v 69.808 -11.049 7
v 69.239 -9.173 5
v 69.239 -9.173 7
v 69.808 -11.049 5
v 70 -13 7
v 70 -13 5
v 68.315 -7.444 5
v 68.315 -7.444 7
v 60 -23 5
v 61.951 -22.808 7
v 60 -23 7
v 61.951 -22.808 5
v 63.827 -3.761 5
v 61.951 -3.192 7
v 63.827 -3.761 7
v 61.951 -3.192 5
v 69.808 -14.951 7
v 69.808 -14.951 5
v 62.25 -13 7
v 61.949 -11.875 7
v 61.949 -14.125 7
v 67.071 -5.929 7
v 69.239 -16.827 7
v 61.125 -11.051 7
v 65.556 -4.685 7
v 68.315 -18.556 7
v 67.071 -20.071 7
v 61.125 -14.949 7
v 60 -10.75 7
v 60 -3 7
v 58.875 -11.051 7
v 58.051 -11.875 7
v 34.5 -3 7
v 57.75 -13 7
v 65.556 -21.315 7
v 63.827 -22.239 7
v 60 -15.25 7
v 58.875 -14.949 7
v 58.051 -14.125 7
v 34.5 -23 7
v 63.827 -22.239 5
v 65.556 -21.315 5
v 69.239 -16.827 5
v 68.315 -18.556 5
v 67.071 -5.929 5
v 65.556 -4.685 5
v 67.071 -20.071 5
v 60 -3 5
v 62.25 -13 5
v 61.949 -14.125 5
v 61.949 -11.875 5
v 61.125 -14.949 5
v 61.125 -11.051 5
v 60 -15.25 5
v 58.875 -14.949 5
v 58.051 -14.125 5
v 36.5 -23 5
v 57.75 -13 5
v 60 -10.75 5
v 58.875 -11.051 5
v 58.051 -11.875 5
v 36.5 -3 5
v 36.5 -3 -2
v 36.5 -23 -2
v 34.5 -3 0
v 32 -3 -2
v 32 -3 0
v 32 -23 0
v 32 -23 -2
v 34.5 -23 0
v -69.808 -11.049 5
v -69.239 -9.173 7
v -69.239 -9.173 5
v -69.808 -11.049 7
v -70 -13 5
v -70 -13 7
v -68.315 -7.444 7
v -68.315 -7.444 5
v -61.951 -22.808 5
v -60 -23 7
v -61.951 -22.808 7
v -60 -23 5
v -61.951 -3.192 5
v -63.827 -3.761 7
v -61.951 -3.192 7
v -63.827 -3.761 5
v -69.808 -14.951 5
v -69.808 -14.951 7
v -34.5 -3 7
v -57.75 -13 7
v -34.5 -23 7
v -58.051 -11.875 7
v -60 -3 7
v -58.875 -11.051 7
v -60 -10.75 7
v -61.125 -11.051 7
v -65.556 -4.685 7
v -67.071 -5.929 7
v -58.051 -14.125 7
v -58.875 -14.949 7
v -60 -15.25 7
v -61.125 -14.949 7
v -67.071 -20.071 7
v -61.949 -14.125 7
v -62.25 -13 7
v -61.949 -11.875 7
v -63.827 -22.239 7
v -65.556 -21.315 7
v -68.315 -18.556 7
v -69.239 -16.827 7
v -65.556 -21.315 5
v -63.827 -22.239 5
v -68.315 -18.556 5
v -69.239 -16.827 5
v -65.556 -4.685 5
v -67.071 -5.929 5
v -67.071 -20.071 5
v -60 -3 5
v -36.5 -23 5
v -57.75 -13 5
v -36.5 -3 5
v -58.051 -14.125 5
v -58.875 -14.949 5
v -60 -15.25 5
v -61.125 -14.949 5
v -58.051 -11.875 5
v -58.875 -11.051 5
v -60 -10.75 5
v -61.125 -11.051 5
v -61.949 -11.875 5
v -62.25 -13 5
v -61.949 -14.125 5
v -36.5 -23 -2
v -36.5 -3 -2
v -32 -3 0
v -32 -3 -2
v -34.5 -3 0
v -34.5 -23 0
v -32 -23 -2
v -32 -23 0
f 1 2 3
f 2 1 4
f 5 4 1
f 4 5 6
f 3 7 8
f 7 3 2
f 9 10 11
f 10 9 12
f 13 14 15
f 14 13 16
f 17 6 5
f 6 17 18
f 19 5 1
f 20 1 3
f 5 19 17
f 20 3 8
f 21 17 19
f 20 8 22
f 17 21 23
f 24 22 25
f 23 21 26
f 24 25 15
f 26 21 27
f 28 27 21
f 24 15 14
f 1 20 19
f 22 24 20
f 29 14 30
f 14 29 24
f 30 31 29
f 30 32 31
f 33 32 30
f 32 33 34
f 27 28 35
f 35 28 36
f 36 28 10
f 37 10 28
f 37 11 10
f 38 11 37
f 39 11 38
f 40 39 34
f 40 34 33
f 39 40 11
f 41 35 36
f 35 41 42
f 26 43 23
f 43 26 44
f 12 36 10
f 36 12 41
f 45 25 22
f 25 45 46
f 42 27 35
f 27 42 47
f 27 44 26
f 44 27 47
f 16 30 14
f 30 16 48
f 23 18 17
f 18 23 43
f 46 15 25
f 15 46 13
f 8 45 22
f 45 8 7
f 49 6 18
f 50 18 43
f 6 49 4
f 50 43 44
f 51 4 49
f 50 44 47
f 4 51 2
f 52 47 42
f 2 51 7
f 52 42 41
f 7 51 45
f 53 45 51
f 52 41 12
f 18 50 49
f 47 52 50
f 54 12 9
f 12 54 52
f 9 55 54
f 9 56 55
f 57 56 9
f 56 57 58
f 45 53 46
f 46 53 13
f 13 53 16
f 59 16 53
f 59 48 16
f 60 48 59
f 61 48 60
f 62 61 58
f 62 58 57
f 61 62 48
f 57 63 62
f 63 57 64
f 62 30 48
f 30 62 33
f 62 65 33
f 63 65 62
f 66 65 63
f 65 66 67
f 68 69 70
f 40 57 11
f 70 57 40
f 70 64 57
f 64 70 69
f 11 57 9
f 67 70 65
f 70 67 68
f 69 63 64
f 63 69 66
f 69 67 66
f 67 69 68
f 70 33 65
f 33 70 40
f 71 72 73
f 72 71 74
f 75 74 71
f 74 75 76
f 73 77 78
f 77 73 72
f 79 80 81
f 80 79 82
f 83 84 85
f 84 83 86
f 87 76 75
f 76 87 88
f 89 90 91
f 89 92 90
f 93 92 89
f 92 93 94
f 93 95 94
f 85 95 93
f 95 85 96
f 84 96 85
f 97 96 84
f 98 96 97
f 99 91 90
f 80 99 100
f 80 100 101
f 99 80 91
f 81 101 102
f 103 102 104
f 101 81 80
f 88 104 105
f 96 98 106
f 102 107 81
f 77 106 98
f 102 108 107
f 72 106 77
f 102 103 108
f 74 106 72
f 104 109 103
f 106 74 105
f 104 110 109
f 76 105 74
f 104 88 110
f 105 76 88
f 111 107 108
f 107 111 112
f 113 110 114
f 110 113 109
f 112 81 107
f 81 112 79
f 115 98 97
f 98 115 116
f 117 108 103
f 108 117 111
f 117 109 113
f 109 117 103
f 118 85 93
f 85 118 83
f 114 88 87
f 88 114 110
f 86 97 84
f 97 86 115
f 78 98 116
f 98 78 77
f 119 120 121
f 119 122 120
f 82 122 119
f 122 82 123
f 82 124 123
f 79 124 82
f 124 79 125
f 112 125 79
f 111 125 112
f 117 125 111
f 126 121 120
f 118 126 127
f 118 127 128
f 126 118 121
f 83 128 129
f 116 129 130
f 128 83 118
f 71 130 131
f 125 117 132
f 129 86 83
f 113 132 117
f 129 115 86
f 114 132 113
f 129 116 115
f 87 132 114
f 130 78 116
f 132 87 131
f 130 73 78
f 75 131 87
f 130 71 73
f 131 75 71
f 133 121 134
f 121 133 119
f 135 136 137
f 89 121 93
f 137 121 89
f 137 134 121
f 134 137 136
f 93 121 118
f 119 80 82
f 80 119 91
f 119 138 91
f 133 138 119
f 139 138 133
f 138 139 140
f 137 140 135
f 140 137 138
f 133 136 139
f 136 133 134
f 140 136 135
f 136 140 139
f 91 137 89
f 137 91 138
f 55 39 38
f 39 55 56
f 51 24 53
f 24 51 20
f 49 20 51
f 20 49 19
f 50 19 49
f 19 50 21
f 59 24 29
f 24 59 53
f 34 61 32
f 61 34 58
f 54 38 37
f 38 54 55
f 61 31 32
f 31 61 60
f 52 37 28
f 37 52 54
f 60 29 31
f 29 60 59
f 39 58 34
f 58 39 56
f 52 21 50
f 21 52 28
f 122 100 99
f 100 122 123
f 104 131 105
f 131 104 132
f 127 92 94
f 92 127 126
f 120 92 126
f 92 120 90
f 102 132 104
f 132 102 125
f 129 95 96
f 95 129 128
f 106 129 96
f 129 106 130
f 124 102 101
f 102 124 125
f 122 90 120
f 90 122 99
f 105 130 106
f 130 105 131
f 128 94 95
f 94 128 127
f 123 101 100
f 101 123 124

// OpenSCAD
bot_thick = 2;
hole_pos_x = 60;
hole_d = 4.5;
bridge_w = 20;
bridge_start=36.5;
bridge_conn=32;
bridge_h=5;
bridge_y_adj=-13;

difference() {
    union() {
        //import("Xperia-10-iii-Cover.stl");
        translate([0,bridge_y_adj,0]) for (m = [0,1]) mirror([m,0,0]) {
            $fn = 32;
            // Bridge platform
            translate([hole_pos_x,0,bridge_h]) cylinder(bot_thick, bridge_w/2, bridge_w/2);
            // Bridge rounding
            translate([bridge_start,-bridge_w/2,bridge_h]) cube([hole_pos_x-bridge_start,bridge_w,bot_thick]);
            // Bridge entry
            translate([bridge_conn,-bridge_w/2,-bot_thick]) cube([bridge_start-bridge_conn,bridge_w,bot_thick]);
            // Vertical part of the bridge
            translate([bridge_start-bot_thick,-bridge_w/2,0]) cube([bot_thick,bridge_w,bridge_h+bot_thick]);


            
        }
    }
    for (x = [hole_pos_x, -hole_pos_x]) {
        $fn = 12;
        translate([x,bridge_y_adj,0]) cylinder(20, hole_d/2, hole_d/2, center=true); 
    }
}
